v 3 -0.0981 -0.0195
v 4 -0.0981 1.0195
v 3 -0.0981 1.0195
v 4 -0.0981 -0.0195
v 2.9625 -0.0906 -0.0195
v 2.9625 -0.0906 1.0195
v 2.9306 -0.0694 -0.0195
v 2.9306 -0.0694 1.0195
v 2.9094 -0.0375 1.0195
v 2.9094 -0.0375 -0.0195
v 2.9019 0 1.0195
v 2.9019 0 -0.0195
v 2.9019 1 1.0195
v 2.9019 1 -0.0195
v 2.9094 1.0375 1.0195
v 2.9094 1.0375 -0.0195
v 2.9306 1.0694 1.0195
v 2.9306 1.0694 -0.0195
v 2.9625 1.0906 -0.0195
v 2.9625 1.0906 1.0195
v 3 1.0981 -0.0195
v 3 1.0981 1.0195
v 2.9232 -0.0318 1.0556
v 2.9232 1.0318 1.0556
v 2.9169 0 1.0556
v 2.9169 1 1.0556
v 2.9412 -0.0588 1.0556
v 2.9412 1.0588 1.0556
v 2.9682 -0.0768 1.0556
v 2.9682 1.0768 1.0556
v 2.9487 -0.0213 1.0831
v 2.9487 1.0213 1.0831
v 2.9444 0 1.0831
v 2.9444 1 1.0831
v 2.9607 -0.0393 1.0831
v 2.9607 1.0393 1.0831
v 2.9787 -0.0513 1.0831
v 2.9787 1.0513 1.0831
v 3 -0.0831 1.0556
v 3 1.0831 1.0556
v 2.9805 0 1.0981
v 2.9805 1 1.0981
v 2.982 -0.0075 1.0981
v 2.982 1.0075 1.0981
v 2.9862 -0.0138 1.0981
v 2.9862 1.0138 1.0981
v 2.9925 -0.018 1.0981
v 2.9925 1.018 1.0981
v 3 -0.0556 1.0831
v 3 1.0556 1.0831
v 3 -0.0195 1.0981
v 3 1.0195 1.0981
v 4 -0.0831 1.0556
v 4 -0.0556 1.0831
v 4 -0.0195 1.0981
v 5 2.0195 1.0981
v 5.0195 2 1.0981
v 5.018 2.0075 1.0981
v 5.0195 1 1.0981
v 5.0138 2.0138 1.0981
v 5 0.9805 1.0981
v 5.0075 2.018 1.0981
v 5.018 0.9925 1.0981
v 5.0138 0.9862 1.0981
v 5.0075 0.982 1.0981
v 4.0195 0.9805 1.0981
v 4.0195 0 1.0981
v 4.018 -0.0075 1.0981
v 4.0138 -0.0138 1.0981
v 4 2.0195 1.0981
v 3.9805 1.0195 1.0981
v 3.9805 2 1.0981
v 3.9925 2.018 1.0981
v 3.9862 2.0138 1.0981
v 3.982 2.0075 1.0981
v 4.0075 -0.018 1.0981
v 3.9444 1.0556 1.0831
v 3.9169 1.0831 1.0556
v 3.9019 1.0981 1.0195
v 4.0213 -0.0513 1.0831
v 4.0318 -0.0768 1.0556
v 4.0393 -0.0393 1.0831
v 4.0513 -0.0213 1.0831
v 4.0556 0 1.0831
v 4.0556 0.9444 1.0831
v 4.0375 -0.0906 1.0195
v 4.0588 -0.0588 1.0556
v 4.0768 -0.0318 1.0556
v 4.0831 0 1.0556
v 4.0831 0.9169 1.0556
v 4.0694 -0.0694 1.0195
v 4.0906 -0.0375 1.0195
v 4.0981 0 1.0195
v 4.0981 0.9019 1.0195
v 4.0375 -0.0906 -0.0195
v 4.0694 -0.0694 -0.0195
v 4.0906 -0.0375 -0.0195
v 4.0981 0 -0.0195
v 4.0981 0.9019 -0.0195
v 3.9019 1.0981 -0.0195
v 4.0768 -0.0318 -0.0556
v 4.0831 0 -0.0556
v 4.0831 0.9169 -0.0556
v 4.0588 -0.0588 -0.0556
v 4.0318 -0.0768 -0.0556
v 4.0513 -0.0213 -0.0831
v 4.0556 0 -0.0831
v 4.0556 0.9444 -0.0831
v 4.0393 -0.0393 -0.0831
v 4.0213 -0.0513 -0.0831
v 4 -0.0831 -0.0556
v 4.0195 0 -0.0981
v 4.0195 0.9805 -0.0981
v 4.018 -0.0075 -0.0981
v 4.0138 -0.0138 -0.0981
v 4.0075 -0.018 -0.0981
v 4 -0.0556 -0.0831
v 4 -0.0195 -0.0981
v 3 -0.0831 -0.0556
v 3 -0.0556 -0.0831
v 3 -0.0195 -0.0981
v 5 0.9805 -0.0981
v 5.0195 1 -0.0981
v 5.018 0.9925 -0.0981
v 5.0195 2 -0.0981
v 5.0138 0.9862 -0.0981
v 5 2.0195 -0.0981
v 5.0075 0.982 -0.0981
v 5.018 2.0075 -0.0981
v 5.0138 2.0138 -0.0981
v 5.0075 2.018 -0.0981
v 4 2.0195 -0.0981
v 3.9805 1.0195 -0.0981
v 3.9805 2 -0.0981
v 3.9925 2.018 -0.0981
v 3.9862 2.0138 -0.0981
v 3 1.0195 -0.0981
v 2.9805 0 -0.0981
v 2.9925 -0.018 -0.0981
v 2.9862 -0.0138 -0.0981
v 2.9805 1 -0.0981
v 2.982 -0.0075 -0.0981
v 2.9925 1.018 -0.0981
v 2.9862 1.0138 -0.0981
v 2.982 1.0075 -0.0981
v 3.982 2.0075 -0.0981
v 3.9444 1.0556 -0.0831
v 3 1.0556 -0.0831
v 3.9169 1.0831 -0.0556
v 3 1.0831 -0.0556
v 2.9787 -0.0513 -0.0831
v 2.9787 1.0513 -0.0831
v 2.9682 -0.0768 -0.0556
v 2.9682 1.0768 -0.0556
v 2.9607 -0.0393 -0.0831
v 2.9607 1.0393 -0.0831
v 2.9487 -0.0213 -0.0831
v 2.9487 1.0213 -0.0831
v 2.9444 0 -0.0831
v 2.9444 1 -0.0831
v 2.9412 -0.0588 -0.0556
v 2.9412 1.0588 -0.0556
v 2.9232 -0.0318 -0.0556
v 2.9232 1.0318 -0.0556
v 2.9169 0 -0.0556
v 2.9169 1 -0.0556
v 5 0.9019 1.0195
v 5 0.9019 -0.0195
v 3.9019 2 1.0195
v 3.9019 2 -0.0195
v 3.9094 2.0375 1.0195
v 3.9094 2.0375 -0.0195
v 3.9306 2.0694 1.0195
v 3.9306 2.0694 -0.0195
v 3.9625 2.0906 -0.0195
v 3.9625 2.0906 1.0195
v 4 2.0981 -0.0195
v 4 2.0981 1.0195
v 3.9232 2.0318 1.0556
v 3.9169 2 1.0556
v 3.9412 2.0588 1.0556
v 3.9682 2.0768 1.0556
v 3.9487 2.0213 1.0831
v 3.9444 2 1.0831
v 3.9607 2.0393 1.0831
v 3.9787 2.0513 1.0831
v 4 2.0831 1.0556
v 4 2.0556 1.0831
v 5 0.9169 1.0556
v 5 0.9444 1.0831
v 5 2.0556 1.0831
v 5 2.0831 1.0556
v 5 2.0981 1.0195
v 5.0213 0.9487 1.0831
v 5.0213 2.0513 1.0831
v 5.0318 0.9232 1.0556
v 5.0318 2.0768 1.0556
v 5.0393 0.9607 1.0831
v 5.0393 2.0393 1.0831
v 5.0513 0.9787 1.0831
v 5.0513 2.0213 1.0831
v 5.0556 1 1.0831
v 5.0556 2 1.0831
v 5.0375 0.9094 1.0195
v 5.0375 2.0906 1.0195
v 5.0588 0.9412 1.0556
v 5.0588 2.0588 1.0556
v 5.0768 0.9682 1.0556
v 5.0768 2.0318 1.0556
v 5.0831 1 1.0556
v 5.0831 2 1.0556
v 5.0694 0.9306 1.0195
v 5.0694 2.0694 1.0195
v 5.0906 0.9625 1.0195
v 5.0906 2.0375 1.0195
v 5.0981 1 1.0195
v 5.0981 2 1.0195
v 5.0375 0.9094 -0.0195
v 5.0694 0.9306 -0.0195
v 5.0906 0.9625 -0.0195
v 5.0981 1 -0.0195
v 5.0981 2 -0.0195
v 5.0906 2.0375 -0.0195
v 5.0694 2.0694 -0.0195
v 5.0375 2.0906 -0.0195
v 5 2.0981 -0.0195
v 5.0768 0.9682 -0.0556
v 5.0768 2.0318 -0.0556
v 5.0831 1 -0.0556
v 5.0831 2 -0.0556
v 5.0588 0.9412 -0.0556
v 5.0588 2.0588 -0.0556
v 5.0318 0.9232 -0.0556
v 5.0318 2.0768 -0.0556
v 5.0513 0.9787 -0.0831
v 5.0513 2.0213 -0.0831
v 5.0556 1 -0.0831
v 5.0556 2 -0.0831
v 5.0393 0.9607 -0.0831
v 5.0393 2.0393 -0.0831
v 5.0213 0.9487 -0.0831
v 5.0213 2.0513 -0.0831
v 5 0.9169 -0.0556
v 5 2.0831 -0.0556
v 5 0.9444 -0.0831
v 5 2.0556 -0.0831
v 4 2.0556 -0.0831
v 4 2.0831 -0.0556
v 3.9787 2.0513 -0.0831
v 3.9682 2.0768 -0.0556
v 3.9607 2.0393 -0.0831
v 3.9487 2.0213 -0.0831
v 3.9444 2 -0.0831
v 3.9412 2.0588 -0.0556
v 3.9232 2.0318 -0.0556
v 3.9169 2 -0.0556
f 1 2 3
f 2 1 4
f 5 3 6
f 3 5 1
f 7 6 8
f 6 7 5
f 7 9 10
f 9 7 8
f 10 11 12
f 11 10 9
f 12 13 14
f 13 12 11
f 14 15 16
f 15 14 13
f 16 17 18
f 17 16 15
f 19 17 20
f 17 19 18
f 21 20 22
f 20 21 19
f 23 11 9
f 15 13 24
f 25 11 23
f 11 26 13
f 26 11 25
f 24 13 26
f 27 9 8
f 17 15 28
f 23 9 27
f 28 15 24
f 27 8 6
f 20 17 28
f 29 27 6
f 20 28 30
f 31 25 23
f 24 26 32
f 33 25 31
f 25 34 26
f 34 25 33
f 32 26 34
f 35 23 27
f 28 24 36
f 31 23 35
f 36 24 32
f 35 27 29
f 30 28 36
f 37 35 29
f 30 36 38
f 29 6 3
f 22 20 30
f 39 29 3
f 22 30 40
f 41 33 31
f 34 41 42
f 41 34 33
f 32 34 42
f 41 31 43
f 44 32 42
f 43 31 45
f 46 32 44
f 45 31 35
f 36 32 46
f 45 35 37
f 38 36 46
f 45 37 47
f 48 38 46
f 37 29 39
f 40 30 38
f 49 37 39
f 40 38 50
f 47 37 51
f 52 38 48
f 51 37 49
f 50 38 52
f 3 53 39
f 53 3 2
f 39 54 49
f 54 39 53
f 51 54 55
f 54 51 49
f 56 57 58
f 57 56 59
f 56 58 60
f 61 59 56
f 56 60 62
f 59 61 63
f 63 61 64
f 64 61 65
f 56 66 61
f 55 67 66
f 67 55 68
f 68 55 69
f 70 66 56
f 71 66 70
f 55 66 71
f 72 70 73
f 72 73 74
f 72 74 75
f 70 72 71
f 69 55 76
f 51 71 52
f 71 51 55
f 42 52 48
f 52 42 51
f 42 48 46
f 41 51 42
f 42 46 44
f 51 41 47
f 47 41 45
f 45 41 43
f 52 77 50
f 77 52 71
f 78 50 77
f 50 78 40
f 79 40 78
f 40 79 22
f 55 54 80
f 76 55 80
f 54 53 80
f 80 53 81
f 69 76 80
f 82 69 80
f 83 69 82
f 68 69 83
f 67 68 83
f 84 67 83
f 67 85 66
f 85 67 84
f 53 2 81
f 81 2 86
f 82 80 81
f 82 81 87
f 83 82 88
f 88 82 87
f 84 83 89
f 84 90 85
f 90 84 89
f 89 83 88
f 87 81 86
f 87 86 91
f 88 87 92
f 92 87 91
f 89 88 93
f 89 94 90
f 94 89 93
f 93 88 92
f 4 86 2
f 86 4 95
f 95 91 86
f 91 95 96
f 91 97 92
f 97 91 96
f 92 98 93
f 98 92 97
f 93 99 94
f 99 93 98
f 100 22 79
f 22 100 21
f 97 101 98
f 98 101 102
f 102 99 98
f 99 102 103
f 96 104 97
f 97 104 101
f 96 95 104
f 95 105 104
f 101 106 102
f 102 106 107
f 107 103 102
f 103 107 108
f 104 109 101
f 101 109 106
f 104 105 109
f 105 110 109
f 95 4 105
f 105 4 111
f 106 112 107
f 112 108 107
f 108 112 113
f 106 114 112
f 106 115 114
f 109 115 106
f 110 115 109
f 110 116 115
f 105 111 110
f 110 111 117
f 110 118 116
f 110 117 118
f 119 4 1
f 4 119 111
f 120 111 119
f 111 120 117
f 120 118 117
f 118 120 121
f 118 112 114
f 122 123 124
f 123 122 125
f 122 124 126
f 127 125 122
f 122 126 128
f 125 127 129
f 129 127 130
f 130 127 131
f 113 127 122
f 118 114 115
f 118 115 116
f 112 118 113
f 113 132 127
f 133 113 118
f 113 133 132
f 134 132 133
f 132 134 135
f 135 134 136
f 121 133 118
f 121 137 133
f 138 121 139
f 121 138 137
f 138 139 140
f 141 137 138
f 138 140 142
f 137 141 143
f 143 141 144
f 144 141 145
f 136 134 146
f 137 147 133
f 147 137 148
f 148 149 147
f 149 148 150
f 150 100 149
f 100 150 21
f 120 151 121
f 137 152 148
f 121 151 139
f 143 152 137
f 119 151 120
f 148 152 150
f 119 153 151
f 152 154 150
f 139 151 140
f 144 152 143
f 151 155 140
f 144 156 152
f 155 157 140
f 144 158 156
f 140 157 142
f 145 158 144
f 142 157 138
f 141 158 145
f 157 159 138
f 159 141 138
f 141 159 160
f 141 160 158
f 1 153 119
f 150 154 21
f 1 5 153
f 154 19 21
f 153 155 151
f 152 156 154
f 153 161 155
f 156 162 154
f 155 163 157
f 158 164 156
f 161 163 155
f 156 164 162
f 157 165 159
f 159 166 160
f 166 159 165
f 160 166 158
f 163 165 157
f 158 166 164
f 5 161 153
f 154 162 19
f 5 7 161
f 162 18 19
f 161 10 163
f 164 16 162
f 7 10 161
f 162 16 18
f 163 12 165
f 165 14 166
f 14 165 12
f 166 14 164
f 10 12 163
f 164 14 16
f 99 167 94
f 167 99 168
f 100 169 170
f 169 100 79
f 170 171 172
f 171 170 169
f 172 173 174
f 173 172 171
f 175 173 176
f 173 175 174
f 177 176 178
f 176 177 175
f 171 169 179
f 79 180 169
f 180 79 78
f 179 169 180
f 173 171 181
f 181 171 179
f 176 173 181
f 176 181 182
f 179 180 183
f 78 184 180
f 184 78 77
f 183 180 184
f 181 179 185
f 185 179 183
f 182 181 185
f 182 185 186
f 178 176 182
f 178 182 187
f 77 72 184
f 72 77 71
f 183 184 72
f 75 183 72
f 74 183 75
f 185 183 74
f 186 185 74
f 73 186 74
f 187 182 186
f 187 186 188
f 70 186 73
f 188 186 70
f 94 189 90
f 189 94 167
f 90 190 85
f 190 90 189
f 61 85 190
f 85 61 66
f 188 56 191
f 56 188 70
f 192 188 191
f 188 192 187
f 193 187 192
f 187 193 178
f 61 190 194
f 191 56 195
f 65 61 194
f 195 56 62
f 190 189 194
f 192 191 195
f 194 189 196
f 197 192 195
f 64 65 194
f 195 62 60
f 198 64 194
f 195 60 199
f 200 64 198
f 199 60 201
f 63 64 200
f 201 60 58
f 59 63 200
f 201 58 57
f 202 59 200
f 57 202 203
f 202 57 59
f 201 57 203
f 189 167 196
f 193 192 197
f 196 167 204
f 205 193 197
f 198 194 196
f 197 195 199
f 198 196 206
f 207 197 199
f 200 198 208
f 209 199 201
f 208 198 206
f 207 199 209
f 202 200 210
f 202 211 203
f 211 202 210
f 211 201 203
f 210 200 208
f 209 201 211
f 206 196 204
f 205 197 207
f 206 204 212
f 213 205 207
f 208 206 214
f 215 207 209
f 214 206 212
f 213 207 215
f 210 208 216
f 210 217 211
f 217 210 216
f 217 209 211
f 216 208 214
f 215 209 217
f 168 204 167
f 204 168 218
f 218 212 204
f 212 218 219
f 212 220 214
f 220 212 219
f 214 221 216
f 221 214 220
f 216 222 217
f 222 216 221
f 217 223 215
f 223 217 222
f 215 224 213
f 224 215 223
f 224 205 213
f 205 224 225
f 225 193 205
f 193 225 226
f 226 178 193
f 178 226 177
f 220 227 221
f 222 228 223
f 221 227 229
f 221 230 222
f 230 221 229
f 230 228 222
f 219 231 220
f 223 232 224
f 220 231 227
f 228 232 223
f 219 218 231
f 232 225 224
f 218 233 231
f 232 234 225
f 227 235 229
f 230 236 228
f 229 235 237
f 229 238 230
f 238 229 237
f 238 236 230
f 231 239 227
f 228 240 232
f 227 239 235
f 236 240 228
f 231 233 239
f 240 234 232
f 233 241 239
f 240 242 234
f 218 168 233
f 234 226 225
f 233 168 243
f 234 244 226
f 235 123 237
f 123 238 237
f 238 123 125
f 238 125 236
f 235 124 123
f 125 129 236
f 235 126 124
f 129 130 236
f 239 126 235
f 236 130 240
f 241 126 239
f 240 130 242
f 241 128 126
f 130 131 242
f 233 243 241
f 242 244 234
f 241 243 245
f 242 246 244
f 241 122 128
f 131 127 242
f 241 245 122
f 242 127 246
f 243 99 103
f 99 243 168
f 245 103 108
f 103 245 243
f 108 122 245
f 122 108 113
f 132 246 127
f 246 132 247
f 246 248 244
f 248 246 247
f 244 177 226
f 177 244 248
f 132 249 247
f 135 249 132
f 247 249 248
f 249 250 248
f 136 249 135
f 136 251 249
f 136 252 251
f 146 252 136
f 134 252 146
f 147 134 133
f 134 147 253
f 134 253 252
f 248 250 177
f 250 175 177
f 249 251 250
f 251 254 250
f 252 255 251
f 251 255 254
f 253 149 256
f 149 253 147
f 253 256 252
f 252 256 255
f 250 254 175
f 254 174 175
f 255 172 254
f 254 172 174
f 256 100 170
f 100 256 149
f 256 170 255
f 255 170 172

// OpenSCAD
minkowski() {
  polyhedron(
    points=[
      [0, 0, 0],
      [1, 0, 0],
      [0, 1, 0],
      [1, 1, 0],
      [0, 0, 1],
      [1, 0, 1],
      [0, 1, 1],
      [1, 1, 1],

      [1, 1, 0],
      [2, 1, 0],
      [1, 2, 0],
      [2, 2, 0],
      [1, 1, 1],
      [2, 1, 1],
      [1, 2, 1],
      [2, 2, 1],
    ],
    faces=[
      [6,7,5],[6,5,4],
      [0,1,3],[0,3,2],
      [4,5,1],[4,1,0],
      [5,7,3],[5,3,1],
      [7,6,2],[7,2,3],
      [6,4,0],[6,0,2],

      [14,15,13],[14,13,12],
      [8,9,11],[8,11,10],
      [12,13,9],[12,9,8],
      [13,15,11],[13,11,9],
      [15,14,10],[15,10,11],
      [14,12,8],[14,8,10],
    ]);
  sphere(0.1, $fn=16);
}

translate([3,0,0]) minkowski() {
  union() {
    cube(1);
    translate([1,1,0]) cube(1);
  }
  sphere(0.1, $fn=16);
}
